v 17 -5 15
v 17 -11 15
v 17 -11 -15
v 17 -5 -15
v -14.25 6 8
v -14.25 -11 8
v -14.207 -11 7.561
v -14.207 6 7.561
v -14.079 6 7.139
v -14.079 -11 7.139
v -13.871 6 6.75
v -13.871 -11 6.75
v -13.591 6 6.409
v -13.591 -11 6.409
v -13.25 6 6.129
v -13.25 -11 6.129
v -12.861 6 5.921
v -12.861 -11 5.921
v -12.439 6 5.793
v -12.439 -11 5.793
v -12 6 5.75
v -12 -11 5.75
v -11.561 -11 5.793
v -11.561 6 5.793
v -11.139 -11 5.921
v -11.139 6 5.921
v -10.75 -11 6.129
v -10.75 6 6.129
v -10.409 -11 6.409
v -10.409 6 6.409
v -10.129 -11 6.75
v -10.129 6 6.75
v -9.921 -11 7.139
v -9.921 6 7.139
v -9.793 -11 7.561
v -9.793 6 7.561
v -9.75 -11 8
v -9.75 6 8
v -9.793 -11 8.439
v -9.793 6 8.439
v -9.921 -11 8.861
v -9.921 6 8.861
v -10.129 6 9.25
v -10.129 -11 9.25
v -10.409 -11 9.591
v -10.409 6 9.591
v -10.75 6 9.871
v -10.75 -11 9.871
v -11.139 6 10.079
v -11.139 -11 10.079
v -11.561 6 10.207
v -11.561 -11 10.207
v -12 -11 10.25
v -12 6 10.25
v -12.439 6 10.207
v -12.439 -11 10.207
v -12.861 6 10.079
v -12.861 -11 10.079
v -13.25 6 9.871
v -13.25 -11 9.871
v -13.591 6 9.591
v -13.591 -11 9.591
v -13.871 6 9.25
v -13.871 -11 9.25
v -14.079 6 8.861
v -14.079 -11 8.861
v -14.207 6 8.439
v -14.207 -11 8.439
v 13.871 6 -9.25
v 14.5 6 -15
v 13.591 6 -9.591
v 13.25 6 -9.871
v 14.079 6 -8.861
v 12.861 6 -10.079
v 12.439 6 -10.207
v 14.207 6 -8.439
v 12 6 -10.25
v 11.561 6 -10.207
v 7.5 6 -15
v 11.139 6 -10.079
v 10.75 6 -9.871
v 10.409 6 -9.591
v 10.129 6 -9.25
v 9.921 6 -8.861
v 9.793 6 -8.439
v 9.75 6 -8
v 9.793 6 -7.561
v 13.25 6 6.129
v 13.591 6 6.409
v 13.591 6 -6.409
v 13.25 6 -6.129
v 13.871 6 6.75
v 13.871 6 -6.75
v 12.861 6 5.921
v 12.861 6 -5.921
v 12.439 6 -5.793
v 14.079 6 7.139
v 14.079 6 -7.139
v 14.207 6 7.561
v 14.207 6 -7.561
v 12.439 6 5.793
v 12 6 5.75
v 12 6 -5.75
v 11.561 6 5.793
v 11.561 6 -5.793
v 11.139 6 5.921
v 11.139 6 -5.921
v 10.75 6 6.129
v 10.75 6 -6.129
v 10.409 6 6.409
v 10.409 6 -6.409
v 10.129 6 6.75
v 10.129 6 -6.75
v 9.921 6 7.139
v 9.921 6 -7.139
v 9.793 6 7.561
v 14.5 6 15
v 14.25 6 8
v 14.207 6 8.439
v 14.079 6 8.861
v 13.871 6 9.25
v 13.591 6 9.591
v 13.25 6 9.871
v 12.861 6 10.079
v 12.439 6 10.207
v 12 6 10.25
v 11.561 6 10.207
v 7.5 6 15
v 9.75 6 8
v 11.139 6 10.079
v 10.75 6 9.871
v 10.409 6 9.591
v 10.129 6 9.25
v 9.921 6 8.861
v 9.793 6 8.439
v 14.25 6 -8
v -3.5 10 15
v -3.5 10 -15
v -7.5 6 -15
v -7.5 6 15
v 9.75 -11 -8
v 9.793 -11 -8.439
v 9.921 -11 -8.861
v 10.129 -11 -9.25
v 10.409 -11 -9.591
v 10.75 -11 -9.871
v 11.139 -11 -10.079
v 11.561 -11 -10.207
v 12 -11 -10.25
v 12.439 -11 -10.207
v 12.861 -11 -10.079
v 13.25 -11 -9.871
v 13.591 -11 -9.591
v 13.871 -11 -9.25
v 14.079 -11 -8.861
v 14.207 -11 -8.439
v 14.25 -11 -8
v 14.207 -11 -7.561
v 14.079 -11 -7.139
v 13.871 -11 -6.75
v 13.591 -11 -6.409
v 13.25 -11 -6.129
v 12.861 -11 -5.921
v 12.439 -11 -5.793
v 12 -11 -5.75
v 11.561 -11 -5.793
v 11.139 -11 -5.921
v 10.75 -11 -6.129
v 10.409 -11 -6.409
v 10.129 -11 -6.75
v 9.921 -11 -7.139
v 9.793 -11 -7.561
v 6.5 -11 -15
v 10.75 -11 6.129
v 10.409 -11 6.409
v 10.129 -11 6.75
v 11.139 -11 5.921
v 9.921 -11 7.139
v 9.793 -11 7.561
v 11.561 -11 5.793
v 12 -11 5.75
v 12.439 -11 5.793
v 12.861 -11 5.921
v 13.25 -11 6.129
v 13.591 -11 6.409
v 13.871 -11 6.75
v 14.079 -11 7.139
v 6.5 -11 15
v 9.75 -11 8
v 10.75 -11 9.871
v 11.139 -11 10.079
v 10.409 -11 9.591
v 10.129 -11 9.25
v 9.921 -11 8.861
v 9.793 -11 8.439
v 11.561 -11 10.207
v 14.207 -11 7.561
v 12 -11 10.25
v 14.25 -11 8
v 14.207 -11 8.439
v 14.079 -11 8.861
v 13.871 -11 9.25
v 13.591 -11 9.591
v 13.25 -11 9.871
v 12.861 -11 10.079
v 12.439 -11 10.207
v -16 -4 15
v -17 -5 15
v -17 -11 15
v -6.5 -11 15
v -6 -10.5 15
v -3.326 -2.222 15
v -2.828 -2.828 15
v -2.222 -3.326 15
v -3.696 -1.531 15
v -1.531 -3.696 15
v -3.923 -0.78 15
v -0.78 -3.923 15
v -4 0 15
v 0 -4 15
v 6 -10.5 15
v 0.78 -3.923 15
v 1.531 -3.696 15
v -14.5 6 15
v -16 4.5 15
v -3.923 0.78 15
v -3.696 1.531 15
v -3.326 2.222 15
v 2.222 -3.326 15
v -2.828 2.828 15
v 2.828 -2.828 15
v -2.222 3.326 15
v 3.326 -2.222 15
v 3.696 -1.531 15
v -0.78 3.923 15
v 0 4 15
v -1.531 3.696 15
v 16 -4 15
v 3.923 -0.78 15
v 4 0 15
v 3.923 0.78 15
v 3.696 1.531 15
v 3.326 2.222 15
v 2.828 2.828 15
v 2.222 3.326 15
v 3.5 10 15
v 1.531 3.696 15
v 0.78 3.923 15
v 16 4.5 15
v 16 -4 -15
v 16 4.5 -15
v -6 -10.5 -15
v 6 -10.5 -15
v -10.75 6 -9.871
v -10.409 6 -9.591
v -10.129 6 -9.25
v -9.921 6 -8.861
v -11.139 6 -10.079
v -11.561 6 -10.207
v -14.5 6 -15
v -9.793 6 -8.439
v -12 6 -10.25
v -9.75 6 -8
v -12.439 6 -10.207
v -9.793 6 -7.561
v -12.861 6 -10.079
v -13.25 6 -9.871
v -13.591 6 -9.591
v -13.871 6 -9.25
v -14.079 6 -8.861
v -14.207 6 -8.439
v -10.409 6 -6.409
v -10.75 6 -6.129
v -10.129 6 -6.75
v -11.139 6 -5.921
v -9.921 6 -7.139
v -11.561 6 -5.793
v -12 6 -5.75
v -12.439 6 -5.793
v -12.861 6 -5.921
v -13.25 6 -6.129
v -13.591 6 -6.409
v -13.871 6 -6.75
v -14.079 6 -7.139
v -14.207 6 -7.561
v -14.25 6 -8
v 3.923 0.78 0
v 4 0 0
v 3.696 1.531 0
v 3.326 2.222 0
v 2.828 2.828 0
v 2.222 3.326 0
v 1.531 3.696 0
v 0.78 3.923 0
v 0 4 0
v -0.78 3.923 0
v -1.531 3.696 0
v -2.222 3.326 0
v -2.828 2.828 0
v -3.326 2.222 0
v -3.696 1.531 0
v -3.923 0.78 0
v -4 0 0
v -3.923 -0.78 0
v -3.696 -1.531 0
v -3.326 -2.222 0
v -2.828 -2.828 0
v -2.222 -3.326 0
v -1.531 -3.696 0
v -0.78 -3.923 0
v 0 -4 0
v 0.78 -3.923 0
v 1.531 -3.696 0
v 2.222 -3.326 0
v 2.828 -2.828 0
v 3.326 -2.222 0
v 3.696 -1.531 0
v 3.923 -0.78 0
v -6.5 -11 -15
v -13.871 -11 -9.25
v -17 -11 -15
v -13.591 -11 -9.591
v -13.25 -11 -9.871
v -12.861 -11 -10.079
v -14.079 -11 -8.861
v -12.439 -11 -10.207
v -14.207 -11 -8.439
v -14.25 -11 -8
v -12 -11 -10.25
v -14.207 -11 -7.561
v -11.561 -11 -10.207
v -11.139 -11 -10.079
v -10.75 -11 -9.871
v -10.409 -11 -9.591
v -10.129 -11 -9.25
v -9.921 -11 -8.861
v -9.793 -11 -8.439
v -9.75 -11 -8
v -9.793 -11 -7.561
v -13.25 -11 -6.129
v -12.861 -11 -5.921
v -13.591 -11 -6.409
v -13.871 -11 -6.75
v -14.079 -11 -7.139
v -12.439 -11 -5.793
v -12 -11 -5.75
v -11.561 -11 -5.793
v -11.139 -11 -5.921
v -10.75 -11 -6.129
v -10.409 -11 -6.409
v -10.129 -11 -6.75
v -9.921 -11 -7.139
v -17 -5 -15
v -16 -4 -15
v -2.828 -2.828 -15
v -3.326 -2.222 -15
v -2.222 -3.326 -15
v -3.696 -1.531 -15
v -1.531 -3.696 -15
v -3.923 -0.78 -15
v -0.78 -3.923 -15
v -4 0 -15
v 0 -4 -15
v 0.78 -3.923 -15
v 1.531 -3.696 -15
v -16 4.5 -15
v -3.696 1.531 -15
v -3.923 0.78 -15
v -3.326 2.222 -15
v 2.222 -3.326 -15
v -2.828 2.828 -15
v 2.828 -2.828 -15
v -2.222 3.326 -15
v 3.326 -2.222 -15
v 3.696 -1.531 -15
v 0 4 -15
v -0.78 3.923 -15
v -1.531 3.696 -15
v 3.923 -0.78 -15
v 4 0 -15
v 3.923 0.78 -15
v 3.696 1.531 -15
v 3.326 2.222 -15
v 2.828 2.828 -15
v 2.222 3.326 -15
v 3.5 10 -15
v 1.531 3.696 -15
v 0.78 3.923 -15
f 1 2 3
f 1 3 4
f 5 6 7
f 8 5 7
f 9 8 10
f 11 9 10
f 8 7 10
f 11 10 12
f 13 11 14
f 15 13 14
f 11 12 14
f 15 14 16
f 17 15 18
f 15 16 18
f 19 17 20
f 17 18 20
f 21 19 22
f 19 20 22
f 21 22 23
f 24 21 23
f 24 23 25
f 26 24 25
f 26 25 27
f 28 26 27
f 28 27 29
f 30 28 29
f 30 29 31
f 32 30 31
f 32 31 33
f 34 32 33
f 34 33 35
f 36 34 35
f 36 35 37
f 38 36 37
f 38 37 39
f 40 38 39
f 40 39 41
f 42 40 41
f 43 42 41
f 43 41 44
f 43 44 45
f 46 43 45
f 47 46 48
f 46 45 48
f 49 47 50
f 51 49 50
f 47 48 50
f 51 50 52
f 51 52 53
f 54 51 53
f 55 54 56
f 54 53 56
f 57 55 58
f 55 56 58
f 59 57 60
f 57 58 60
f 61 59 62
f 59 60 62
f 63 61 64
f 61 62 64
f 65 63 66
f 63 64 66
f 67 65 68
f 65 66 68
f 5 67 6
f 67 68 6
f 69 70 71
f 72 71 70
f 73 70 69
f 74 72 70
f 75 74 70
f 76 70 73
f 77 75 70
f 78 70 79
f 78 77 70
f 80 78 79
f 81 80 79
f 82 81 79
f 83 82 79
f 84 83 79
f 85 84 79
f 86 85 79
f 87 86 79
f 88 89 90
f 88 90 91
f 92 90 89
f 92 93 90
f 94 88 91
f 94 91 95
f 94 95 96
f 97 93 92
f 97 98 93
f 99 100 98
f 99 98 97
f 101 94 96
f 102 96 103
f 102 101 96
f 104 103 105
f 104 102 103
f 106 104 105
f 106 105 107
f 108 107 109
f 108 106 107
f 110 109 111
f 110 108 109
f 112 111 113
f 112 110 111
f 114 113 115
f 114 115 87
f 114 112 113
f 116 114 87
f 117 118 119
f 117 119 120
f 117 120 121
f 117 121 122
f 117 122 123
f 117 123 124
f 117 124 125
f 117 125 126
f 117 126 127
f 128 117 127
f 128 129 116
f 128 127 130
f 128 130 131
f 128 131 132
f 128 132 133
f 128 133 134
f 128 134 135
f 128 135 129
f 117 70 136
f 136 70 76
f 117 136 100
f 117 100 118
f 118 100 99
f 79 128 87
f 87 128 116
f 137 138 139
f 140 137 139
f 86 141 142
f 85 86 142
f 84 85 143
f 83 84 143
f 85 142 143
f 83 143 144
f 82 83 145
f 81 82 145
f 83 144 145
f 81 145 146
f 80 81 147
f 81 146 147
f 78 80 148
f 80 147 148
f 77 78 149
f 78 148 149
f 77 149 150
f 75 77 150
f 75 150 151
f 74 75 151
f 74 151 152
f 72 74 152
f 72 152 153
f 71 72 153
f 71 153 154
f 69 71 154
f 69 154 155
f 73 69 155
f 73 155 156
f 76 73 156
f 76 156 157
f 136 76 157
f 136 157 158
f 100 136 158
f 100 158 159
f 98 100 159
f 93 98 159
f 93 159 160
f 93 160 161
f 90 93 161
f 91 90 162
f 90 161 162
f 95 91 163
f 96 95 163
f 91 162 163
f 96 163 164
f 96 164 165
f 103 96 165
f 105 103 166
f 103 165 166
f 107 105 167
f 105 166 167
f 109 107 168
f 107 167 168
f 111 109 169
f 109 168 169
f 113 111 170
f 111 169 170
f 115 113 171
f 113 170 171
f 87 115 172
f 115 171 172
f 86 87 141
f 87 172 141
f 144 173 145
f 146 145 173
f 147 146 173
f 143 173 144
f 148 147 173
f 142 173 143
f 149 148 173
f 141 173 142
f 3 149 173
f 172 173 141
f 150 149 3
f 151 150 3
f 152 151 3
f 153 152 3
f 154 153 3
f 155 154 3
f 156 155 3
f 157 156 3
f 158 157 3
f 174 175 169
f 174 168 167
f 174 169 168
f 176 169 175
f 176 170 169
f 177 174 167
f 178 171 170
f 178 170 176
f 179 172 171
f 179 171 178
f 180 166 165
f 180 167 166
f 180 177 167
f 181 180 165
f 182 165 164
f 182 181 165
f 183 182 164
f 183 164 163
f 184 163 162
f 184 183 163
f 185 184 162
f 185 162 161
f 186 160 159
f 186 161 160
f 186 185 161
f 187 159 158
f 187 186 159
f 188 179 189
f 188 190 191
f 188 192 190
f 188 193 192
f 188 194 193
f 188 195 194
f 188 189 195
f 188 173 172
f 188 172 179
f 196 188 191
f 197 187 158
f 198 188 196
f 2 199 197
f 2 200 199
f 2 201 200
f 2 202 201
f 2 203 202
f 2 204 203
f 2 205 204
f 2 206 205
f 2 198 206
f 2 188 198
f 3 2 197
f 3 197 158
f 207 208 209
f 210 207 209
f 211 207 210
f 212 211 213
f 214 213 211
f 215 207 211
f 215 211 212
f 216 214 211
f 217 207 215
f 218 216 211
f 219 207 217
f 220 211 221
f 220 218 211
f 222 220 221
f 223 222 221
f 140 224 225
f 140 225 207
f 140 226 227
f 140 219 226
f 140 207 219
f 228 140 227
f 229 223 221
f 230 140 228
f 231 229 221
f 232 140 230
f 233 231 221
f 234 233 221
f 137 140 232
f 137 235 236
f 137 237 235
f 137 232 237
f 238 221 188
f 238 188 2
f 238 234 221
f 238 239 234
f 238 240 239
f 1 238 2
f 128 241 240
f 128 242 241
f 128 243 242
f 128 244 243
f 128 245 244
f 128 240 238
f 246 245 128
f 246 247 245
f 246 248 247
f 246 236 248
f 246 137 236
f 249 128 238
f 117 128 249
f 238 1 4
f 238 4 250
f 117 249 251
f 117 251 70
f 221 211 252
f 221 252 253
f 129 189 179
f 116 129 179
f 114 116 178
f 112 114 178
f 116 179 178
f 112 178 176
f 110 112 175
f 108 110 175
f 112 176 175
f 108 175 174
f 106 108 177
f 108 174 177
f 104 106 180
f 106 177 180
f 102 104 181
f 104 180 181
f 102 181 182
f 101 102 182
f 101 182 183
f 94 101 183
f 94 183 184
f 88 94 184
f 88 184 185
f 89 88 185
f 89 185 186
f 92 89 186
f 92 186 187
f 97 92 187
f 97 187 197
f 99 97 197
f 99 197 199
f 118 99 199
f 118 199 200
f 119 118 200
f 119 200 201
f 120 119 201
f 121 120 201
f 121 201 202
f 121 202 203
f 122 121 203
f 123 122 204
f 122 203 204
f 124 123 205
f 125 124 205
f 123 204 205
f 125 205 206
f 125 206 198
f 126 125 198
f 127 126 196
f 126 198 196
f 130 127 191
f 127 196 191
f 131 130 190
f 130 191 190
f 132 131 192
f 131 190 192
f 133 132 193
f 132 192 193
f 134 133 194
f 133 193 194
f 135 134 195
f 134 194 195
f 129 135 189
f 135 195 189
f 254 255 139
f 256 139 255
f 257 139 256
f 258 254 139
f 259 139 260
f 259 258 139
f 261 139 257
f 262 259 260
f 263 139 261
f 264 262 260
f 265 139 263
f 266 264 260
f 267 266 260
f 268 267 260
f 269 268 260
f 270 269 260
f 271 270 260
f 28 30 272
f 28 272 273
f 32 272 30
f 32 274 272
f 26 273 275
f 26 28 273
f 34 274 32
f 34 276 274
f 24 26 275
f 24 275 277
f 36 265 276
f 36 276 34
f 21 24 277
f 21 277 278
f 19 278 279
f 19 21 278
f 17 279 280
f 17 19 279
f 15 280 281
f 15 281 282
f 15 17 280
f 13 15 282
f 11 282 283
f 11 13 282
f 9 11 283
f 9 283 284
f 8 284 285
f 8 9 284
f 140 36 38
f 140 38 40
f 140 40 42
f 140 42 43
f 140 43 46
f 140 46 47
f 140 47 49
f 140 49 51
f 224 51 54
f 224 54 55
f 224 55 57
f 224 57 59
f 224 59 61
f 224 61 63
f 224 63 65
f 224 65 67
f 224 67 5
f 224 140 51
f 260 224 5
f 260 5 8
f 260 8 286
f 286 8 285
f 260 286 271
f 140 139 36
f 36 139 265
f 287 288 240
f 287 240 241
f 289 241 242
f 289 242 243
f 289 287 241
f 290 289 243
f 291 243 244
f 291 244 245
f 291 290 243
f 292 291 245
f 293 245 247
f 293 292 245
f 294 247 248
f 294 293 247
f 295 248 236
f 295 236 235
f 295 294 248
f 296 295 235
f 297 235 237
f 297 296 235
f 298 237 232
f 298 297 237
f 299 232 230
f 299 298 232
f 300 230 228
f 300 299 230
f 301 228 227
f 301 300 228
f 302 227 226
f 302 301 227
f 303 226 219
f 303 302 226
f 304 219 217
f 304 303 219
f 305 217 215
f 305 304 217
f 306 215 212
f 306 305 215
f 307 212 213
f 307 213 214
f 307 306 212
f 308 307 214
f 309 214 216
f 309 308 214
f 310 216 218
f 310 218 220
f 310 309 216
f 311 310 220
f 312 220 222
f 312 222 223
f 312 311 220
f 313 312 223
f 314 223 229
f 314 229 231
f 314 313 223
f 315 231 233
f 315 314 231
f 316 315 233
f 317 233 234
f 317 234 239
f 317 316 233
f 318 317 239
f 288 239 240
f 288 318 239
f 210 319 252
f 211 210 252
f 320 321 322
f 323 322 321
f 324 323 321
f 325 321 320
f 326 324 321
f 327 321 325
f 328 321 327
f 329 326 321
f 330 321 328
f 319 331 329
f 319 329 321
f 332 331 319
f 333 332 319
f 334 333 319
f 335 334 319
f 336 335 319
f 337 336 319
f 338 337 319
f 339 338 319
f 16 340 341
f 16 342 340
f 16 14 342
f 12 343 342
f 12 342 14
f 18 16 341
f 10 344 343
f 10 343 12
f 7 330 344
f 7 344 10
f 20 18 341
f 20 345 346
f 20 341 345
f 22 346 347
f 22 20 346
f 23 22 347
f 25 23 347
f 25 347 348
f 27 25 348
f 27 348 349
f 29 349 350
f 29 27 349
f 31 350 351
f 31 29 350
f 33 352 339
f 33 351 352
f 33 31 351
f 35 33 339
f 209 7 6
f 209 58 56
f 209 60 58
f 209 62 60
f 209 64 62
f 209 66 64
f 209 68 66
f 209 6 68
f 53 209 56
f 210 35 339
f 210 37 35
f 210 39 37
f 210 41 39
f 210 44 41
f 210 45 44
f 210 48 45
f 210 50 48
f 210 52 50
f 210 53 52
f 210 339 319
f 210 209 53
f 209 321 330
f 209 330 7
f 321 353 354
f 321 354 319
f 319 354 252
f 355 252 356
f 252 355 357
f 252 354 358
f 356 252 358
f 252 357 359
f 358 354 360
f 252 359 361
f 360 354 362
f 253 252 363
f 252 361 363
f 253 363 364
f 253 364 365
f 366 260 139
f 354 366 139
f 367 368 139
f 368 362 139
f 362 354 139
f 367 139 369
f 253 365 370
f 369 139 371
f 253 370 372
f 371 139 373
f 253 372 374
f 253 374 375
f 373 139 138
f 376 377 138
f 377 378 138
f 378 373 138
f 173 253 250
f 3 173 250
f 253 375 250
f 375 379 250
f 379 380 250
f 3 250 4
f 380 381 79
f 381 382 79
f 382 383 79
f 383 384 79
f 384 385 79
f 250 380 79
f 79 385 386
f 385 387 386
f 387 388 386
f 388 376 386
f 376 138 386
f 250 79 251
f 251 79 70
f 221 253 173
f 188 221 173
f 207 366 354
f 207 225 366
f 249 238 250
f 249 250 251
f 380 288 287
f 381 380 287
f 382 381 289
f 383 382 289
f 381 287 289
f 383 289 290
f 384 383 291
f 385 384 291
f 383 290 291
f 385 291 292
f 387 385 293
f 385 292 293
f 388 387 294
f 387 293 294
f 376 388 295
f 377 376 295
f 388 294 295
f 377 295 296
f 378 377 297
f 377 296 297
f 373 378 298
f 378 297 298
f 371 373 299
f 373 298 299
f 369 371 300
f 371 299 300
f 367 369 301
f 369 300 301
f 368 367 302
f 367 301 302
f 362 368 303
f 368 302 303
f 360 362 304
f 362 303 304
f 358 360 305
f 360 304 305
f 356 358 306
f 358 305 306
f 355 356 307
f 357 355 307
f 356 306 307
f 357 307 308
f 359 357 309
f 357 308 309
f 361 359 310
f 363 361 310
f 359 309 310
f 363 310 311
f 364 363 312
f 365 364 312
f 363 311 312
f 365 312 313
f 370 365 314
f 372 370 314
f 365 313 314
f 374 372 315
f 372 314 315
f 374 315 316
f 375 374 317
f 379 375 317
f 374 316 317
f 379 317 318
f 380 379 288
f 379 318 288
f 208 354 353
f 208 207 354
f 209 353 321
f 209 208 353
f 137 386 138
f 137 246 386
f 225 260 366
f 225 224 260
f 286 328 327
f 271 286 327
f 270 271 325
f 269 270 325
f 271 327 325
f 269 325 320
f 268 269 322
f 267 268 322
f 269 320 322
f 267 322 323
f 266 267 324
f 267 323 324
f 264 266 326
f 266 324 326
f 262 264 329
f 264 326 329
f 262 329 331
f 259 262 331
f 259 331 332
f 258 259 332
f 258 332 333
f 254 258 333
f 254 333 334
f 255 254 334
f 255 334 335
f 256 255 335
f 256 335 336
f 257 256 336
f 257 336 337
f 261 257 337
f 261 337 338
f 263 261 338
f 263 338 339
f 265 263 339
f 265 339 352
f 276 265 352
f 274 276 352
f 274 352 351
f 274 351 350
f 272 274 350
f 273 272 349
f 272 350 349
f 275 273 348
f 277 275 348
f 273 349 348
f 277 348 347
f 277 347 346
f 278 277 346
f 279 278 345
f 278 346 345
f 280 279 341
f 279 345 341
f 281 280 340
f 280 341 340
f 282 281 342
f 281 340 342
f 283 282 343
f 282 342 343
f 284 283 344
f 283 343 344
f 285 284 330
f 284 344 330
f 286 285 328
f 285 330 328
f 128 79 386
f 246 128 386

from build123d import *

# Parameters (mm, degrees)
BOSS_EXTRU_1_DEPTH      = 15
BOSS_EXTRU_1_DEPTH_BACK = 15
ESQUISSE1_R             = 4
D_GAGEMENT_M41_D        = 4.5


with BuildPart() as part:
    # Esquisse1 → Boss.-Extru.1 (new, two sides: drawn at the far end of the back side and taken through both)
    with BuildSketch(Plane.XY.offset(-BOSS_EXTRU_1_DEPTH_BACK)):
        Polygon((-17, -5), (-17, -11), (-6.5, -11), (-6, -10.5), (6, -10.5), (6.5, -11), (17, -11), (17, -5), (16, -4), (16, 4.5), (14.5, 6), (7.5, 6), (3.5, 10), (-3.5, 10), (-7.5, 6), (-14.5, 6), (-16, 4.5), (-16, -4), align=None)
        Circle(ESQUISSE1_R, mode=Mode.SUBTRACT)
    extrude(amount=BOSS_EXTRU_1_DEPTH + BOSS_EXTRU_1_DEPTH_BACK)

    # Dégagement M41 (through all)
    with Locations(Plane(origin=(0, 6, 0), x_dir=(1, 0, 0), z_dir=(0, 1, 0))):
        with Locations((-12, 8), (12, 8), (12, -8), (-12, -8)):
            Hole(D_GAGEMENT_M41_D / 2)


solid = part.part
